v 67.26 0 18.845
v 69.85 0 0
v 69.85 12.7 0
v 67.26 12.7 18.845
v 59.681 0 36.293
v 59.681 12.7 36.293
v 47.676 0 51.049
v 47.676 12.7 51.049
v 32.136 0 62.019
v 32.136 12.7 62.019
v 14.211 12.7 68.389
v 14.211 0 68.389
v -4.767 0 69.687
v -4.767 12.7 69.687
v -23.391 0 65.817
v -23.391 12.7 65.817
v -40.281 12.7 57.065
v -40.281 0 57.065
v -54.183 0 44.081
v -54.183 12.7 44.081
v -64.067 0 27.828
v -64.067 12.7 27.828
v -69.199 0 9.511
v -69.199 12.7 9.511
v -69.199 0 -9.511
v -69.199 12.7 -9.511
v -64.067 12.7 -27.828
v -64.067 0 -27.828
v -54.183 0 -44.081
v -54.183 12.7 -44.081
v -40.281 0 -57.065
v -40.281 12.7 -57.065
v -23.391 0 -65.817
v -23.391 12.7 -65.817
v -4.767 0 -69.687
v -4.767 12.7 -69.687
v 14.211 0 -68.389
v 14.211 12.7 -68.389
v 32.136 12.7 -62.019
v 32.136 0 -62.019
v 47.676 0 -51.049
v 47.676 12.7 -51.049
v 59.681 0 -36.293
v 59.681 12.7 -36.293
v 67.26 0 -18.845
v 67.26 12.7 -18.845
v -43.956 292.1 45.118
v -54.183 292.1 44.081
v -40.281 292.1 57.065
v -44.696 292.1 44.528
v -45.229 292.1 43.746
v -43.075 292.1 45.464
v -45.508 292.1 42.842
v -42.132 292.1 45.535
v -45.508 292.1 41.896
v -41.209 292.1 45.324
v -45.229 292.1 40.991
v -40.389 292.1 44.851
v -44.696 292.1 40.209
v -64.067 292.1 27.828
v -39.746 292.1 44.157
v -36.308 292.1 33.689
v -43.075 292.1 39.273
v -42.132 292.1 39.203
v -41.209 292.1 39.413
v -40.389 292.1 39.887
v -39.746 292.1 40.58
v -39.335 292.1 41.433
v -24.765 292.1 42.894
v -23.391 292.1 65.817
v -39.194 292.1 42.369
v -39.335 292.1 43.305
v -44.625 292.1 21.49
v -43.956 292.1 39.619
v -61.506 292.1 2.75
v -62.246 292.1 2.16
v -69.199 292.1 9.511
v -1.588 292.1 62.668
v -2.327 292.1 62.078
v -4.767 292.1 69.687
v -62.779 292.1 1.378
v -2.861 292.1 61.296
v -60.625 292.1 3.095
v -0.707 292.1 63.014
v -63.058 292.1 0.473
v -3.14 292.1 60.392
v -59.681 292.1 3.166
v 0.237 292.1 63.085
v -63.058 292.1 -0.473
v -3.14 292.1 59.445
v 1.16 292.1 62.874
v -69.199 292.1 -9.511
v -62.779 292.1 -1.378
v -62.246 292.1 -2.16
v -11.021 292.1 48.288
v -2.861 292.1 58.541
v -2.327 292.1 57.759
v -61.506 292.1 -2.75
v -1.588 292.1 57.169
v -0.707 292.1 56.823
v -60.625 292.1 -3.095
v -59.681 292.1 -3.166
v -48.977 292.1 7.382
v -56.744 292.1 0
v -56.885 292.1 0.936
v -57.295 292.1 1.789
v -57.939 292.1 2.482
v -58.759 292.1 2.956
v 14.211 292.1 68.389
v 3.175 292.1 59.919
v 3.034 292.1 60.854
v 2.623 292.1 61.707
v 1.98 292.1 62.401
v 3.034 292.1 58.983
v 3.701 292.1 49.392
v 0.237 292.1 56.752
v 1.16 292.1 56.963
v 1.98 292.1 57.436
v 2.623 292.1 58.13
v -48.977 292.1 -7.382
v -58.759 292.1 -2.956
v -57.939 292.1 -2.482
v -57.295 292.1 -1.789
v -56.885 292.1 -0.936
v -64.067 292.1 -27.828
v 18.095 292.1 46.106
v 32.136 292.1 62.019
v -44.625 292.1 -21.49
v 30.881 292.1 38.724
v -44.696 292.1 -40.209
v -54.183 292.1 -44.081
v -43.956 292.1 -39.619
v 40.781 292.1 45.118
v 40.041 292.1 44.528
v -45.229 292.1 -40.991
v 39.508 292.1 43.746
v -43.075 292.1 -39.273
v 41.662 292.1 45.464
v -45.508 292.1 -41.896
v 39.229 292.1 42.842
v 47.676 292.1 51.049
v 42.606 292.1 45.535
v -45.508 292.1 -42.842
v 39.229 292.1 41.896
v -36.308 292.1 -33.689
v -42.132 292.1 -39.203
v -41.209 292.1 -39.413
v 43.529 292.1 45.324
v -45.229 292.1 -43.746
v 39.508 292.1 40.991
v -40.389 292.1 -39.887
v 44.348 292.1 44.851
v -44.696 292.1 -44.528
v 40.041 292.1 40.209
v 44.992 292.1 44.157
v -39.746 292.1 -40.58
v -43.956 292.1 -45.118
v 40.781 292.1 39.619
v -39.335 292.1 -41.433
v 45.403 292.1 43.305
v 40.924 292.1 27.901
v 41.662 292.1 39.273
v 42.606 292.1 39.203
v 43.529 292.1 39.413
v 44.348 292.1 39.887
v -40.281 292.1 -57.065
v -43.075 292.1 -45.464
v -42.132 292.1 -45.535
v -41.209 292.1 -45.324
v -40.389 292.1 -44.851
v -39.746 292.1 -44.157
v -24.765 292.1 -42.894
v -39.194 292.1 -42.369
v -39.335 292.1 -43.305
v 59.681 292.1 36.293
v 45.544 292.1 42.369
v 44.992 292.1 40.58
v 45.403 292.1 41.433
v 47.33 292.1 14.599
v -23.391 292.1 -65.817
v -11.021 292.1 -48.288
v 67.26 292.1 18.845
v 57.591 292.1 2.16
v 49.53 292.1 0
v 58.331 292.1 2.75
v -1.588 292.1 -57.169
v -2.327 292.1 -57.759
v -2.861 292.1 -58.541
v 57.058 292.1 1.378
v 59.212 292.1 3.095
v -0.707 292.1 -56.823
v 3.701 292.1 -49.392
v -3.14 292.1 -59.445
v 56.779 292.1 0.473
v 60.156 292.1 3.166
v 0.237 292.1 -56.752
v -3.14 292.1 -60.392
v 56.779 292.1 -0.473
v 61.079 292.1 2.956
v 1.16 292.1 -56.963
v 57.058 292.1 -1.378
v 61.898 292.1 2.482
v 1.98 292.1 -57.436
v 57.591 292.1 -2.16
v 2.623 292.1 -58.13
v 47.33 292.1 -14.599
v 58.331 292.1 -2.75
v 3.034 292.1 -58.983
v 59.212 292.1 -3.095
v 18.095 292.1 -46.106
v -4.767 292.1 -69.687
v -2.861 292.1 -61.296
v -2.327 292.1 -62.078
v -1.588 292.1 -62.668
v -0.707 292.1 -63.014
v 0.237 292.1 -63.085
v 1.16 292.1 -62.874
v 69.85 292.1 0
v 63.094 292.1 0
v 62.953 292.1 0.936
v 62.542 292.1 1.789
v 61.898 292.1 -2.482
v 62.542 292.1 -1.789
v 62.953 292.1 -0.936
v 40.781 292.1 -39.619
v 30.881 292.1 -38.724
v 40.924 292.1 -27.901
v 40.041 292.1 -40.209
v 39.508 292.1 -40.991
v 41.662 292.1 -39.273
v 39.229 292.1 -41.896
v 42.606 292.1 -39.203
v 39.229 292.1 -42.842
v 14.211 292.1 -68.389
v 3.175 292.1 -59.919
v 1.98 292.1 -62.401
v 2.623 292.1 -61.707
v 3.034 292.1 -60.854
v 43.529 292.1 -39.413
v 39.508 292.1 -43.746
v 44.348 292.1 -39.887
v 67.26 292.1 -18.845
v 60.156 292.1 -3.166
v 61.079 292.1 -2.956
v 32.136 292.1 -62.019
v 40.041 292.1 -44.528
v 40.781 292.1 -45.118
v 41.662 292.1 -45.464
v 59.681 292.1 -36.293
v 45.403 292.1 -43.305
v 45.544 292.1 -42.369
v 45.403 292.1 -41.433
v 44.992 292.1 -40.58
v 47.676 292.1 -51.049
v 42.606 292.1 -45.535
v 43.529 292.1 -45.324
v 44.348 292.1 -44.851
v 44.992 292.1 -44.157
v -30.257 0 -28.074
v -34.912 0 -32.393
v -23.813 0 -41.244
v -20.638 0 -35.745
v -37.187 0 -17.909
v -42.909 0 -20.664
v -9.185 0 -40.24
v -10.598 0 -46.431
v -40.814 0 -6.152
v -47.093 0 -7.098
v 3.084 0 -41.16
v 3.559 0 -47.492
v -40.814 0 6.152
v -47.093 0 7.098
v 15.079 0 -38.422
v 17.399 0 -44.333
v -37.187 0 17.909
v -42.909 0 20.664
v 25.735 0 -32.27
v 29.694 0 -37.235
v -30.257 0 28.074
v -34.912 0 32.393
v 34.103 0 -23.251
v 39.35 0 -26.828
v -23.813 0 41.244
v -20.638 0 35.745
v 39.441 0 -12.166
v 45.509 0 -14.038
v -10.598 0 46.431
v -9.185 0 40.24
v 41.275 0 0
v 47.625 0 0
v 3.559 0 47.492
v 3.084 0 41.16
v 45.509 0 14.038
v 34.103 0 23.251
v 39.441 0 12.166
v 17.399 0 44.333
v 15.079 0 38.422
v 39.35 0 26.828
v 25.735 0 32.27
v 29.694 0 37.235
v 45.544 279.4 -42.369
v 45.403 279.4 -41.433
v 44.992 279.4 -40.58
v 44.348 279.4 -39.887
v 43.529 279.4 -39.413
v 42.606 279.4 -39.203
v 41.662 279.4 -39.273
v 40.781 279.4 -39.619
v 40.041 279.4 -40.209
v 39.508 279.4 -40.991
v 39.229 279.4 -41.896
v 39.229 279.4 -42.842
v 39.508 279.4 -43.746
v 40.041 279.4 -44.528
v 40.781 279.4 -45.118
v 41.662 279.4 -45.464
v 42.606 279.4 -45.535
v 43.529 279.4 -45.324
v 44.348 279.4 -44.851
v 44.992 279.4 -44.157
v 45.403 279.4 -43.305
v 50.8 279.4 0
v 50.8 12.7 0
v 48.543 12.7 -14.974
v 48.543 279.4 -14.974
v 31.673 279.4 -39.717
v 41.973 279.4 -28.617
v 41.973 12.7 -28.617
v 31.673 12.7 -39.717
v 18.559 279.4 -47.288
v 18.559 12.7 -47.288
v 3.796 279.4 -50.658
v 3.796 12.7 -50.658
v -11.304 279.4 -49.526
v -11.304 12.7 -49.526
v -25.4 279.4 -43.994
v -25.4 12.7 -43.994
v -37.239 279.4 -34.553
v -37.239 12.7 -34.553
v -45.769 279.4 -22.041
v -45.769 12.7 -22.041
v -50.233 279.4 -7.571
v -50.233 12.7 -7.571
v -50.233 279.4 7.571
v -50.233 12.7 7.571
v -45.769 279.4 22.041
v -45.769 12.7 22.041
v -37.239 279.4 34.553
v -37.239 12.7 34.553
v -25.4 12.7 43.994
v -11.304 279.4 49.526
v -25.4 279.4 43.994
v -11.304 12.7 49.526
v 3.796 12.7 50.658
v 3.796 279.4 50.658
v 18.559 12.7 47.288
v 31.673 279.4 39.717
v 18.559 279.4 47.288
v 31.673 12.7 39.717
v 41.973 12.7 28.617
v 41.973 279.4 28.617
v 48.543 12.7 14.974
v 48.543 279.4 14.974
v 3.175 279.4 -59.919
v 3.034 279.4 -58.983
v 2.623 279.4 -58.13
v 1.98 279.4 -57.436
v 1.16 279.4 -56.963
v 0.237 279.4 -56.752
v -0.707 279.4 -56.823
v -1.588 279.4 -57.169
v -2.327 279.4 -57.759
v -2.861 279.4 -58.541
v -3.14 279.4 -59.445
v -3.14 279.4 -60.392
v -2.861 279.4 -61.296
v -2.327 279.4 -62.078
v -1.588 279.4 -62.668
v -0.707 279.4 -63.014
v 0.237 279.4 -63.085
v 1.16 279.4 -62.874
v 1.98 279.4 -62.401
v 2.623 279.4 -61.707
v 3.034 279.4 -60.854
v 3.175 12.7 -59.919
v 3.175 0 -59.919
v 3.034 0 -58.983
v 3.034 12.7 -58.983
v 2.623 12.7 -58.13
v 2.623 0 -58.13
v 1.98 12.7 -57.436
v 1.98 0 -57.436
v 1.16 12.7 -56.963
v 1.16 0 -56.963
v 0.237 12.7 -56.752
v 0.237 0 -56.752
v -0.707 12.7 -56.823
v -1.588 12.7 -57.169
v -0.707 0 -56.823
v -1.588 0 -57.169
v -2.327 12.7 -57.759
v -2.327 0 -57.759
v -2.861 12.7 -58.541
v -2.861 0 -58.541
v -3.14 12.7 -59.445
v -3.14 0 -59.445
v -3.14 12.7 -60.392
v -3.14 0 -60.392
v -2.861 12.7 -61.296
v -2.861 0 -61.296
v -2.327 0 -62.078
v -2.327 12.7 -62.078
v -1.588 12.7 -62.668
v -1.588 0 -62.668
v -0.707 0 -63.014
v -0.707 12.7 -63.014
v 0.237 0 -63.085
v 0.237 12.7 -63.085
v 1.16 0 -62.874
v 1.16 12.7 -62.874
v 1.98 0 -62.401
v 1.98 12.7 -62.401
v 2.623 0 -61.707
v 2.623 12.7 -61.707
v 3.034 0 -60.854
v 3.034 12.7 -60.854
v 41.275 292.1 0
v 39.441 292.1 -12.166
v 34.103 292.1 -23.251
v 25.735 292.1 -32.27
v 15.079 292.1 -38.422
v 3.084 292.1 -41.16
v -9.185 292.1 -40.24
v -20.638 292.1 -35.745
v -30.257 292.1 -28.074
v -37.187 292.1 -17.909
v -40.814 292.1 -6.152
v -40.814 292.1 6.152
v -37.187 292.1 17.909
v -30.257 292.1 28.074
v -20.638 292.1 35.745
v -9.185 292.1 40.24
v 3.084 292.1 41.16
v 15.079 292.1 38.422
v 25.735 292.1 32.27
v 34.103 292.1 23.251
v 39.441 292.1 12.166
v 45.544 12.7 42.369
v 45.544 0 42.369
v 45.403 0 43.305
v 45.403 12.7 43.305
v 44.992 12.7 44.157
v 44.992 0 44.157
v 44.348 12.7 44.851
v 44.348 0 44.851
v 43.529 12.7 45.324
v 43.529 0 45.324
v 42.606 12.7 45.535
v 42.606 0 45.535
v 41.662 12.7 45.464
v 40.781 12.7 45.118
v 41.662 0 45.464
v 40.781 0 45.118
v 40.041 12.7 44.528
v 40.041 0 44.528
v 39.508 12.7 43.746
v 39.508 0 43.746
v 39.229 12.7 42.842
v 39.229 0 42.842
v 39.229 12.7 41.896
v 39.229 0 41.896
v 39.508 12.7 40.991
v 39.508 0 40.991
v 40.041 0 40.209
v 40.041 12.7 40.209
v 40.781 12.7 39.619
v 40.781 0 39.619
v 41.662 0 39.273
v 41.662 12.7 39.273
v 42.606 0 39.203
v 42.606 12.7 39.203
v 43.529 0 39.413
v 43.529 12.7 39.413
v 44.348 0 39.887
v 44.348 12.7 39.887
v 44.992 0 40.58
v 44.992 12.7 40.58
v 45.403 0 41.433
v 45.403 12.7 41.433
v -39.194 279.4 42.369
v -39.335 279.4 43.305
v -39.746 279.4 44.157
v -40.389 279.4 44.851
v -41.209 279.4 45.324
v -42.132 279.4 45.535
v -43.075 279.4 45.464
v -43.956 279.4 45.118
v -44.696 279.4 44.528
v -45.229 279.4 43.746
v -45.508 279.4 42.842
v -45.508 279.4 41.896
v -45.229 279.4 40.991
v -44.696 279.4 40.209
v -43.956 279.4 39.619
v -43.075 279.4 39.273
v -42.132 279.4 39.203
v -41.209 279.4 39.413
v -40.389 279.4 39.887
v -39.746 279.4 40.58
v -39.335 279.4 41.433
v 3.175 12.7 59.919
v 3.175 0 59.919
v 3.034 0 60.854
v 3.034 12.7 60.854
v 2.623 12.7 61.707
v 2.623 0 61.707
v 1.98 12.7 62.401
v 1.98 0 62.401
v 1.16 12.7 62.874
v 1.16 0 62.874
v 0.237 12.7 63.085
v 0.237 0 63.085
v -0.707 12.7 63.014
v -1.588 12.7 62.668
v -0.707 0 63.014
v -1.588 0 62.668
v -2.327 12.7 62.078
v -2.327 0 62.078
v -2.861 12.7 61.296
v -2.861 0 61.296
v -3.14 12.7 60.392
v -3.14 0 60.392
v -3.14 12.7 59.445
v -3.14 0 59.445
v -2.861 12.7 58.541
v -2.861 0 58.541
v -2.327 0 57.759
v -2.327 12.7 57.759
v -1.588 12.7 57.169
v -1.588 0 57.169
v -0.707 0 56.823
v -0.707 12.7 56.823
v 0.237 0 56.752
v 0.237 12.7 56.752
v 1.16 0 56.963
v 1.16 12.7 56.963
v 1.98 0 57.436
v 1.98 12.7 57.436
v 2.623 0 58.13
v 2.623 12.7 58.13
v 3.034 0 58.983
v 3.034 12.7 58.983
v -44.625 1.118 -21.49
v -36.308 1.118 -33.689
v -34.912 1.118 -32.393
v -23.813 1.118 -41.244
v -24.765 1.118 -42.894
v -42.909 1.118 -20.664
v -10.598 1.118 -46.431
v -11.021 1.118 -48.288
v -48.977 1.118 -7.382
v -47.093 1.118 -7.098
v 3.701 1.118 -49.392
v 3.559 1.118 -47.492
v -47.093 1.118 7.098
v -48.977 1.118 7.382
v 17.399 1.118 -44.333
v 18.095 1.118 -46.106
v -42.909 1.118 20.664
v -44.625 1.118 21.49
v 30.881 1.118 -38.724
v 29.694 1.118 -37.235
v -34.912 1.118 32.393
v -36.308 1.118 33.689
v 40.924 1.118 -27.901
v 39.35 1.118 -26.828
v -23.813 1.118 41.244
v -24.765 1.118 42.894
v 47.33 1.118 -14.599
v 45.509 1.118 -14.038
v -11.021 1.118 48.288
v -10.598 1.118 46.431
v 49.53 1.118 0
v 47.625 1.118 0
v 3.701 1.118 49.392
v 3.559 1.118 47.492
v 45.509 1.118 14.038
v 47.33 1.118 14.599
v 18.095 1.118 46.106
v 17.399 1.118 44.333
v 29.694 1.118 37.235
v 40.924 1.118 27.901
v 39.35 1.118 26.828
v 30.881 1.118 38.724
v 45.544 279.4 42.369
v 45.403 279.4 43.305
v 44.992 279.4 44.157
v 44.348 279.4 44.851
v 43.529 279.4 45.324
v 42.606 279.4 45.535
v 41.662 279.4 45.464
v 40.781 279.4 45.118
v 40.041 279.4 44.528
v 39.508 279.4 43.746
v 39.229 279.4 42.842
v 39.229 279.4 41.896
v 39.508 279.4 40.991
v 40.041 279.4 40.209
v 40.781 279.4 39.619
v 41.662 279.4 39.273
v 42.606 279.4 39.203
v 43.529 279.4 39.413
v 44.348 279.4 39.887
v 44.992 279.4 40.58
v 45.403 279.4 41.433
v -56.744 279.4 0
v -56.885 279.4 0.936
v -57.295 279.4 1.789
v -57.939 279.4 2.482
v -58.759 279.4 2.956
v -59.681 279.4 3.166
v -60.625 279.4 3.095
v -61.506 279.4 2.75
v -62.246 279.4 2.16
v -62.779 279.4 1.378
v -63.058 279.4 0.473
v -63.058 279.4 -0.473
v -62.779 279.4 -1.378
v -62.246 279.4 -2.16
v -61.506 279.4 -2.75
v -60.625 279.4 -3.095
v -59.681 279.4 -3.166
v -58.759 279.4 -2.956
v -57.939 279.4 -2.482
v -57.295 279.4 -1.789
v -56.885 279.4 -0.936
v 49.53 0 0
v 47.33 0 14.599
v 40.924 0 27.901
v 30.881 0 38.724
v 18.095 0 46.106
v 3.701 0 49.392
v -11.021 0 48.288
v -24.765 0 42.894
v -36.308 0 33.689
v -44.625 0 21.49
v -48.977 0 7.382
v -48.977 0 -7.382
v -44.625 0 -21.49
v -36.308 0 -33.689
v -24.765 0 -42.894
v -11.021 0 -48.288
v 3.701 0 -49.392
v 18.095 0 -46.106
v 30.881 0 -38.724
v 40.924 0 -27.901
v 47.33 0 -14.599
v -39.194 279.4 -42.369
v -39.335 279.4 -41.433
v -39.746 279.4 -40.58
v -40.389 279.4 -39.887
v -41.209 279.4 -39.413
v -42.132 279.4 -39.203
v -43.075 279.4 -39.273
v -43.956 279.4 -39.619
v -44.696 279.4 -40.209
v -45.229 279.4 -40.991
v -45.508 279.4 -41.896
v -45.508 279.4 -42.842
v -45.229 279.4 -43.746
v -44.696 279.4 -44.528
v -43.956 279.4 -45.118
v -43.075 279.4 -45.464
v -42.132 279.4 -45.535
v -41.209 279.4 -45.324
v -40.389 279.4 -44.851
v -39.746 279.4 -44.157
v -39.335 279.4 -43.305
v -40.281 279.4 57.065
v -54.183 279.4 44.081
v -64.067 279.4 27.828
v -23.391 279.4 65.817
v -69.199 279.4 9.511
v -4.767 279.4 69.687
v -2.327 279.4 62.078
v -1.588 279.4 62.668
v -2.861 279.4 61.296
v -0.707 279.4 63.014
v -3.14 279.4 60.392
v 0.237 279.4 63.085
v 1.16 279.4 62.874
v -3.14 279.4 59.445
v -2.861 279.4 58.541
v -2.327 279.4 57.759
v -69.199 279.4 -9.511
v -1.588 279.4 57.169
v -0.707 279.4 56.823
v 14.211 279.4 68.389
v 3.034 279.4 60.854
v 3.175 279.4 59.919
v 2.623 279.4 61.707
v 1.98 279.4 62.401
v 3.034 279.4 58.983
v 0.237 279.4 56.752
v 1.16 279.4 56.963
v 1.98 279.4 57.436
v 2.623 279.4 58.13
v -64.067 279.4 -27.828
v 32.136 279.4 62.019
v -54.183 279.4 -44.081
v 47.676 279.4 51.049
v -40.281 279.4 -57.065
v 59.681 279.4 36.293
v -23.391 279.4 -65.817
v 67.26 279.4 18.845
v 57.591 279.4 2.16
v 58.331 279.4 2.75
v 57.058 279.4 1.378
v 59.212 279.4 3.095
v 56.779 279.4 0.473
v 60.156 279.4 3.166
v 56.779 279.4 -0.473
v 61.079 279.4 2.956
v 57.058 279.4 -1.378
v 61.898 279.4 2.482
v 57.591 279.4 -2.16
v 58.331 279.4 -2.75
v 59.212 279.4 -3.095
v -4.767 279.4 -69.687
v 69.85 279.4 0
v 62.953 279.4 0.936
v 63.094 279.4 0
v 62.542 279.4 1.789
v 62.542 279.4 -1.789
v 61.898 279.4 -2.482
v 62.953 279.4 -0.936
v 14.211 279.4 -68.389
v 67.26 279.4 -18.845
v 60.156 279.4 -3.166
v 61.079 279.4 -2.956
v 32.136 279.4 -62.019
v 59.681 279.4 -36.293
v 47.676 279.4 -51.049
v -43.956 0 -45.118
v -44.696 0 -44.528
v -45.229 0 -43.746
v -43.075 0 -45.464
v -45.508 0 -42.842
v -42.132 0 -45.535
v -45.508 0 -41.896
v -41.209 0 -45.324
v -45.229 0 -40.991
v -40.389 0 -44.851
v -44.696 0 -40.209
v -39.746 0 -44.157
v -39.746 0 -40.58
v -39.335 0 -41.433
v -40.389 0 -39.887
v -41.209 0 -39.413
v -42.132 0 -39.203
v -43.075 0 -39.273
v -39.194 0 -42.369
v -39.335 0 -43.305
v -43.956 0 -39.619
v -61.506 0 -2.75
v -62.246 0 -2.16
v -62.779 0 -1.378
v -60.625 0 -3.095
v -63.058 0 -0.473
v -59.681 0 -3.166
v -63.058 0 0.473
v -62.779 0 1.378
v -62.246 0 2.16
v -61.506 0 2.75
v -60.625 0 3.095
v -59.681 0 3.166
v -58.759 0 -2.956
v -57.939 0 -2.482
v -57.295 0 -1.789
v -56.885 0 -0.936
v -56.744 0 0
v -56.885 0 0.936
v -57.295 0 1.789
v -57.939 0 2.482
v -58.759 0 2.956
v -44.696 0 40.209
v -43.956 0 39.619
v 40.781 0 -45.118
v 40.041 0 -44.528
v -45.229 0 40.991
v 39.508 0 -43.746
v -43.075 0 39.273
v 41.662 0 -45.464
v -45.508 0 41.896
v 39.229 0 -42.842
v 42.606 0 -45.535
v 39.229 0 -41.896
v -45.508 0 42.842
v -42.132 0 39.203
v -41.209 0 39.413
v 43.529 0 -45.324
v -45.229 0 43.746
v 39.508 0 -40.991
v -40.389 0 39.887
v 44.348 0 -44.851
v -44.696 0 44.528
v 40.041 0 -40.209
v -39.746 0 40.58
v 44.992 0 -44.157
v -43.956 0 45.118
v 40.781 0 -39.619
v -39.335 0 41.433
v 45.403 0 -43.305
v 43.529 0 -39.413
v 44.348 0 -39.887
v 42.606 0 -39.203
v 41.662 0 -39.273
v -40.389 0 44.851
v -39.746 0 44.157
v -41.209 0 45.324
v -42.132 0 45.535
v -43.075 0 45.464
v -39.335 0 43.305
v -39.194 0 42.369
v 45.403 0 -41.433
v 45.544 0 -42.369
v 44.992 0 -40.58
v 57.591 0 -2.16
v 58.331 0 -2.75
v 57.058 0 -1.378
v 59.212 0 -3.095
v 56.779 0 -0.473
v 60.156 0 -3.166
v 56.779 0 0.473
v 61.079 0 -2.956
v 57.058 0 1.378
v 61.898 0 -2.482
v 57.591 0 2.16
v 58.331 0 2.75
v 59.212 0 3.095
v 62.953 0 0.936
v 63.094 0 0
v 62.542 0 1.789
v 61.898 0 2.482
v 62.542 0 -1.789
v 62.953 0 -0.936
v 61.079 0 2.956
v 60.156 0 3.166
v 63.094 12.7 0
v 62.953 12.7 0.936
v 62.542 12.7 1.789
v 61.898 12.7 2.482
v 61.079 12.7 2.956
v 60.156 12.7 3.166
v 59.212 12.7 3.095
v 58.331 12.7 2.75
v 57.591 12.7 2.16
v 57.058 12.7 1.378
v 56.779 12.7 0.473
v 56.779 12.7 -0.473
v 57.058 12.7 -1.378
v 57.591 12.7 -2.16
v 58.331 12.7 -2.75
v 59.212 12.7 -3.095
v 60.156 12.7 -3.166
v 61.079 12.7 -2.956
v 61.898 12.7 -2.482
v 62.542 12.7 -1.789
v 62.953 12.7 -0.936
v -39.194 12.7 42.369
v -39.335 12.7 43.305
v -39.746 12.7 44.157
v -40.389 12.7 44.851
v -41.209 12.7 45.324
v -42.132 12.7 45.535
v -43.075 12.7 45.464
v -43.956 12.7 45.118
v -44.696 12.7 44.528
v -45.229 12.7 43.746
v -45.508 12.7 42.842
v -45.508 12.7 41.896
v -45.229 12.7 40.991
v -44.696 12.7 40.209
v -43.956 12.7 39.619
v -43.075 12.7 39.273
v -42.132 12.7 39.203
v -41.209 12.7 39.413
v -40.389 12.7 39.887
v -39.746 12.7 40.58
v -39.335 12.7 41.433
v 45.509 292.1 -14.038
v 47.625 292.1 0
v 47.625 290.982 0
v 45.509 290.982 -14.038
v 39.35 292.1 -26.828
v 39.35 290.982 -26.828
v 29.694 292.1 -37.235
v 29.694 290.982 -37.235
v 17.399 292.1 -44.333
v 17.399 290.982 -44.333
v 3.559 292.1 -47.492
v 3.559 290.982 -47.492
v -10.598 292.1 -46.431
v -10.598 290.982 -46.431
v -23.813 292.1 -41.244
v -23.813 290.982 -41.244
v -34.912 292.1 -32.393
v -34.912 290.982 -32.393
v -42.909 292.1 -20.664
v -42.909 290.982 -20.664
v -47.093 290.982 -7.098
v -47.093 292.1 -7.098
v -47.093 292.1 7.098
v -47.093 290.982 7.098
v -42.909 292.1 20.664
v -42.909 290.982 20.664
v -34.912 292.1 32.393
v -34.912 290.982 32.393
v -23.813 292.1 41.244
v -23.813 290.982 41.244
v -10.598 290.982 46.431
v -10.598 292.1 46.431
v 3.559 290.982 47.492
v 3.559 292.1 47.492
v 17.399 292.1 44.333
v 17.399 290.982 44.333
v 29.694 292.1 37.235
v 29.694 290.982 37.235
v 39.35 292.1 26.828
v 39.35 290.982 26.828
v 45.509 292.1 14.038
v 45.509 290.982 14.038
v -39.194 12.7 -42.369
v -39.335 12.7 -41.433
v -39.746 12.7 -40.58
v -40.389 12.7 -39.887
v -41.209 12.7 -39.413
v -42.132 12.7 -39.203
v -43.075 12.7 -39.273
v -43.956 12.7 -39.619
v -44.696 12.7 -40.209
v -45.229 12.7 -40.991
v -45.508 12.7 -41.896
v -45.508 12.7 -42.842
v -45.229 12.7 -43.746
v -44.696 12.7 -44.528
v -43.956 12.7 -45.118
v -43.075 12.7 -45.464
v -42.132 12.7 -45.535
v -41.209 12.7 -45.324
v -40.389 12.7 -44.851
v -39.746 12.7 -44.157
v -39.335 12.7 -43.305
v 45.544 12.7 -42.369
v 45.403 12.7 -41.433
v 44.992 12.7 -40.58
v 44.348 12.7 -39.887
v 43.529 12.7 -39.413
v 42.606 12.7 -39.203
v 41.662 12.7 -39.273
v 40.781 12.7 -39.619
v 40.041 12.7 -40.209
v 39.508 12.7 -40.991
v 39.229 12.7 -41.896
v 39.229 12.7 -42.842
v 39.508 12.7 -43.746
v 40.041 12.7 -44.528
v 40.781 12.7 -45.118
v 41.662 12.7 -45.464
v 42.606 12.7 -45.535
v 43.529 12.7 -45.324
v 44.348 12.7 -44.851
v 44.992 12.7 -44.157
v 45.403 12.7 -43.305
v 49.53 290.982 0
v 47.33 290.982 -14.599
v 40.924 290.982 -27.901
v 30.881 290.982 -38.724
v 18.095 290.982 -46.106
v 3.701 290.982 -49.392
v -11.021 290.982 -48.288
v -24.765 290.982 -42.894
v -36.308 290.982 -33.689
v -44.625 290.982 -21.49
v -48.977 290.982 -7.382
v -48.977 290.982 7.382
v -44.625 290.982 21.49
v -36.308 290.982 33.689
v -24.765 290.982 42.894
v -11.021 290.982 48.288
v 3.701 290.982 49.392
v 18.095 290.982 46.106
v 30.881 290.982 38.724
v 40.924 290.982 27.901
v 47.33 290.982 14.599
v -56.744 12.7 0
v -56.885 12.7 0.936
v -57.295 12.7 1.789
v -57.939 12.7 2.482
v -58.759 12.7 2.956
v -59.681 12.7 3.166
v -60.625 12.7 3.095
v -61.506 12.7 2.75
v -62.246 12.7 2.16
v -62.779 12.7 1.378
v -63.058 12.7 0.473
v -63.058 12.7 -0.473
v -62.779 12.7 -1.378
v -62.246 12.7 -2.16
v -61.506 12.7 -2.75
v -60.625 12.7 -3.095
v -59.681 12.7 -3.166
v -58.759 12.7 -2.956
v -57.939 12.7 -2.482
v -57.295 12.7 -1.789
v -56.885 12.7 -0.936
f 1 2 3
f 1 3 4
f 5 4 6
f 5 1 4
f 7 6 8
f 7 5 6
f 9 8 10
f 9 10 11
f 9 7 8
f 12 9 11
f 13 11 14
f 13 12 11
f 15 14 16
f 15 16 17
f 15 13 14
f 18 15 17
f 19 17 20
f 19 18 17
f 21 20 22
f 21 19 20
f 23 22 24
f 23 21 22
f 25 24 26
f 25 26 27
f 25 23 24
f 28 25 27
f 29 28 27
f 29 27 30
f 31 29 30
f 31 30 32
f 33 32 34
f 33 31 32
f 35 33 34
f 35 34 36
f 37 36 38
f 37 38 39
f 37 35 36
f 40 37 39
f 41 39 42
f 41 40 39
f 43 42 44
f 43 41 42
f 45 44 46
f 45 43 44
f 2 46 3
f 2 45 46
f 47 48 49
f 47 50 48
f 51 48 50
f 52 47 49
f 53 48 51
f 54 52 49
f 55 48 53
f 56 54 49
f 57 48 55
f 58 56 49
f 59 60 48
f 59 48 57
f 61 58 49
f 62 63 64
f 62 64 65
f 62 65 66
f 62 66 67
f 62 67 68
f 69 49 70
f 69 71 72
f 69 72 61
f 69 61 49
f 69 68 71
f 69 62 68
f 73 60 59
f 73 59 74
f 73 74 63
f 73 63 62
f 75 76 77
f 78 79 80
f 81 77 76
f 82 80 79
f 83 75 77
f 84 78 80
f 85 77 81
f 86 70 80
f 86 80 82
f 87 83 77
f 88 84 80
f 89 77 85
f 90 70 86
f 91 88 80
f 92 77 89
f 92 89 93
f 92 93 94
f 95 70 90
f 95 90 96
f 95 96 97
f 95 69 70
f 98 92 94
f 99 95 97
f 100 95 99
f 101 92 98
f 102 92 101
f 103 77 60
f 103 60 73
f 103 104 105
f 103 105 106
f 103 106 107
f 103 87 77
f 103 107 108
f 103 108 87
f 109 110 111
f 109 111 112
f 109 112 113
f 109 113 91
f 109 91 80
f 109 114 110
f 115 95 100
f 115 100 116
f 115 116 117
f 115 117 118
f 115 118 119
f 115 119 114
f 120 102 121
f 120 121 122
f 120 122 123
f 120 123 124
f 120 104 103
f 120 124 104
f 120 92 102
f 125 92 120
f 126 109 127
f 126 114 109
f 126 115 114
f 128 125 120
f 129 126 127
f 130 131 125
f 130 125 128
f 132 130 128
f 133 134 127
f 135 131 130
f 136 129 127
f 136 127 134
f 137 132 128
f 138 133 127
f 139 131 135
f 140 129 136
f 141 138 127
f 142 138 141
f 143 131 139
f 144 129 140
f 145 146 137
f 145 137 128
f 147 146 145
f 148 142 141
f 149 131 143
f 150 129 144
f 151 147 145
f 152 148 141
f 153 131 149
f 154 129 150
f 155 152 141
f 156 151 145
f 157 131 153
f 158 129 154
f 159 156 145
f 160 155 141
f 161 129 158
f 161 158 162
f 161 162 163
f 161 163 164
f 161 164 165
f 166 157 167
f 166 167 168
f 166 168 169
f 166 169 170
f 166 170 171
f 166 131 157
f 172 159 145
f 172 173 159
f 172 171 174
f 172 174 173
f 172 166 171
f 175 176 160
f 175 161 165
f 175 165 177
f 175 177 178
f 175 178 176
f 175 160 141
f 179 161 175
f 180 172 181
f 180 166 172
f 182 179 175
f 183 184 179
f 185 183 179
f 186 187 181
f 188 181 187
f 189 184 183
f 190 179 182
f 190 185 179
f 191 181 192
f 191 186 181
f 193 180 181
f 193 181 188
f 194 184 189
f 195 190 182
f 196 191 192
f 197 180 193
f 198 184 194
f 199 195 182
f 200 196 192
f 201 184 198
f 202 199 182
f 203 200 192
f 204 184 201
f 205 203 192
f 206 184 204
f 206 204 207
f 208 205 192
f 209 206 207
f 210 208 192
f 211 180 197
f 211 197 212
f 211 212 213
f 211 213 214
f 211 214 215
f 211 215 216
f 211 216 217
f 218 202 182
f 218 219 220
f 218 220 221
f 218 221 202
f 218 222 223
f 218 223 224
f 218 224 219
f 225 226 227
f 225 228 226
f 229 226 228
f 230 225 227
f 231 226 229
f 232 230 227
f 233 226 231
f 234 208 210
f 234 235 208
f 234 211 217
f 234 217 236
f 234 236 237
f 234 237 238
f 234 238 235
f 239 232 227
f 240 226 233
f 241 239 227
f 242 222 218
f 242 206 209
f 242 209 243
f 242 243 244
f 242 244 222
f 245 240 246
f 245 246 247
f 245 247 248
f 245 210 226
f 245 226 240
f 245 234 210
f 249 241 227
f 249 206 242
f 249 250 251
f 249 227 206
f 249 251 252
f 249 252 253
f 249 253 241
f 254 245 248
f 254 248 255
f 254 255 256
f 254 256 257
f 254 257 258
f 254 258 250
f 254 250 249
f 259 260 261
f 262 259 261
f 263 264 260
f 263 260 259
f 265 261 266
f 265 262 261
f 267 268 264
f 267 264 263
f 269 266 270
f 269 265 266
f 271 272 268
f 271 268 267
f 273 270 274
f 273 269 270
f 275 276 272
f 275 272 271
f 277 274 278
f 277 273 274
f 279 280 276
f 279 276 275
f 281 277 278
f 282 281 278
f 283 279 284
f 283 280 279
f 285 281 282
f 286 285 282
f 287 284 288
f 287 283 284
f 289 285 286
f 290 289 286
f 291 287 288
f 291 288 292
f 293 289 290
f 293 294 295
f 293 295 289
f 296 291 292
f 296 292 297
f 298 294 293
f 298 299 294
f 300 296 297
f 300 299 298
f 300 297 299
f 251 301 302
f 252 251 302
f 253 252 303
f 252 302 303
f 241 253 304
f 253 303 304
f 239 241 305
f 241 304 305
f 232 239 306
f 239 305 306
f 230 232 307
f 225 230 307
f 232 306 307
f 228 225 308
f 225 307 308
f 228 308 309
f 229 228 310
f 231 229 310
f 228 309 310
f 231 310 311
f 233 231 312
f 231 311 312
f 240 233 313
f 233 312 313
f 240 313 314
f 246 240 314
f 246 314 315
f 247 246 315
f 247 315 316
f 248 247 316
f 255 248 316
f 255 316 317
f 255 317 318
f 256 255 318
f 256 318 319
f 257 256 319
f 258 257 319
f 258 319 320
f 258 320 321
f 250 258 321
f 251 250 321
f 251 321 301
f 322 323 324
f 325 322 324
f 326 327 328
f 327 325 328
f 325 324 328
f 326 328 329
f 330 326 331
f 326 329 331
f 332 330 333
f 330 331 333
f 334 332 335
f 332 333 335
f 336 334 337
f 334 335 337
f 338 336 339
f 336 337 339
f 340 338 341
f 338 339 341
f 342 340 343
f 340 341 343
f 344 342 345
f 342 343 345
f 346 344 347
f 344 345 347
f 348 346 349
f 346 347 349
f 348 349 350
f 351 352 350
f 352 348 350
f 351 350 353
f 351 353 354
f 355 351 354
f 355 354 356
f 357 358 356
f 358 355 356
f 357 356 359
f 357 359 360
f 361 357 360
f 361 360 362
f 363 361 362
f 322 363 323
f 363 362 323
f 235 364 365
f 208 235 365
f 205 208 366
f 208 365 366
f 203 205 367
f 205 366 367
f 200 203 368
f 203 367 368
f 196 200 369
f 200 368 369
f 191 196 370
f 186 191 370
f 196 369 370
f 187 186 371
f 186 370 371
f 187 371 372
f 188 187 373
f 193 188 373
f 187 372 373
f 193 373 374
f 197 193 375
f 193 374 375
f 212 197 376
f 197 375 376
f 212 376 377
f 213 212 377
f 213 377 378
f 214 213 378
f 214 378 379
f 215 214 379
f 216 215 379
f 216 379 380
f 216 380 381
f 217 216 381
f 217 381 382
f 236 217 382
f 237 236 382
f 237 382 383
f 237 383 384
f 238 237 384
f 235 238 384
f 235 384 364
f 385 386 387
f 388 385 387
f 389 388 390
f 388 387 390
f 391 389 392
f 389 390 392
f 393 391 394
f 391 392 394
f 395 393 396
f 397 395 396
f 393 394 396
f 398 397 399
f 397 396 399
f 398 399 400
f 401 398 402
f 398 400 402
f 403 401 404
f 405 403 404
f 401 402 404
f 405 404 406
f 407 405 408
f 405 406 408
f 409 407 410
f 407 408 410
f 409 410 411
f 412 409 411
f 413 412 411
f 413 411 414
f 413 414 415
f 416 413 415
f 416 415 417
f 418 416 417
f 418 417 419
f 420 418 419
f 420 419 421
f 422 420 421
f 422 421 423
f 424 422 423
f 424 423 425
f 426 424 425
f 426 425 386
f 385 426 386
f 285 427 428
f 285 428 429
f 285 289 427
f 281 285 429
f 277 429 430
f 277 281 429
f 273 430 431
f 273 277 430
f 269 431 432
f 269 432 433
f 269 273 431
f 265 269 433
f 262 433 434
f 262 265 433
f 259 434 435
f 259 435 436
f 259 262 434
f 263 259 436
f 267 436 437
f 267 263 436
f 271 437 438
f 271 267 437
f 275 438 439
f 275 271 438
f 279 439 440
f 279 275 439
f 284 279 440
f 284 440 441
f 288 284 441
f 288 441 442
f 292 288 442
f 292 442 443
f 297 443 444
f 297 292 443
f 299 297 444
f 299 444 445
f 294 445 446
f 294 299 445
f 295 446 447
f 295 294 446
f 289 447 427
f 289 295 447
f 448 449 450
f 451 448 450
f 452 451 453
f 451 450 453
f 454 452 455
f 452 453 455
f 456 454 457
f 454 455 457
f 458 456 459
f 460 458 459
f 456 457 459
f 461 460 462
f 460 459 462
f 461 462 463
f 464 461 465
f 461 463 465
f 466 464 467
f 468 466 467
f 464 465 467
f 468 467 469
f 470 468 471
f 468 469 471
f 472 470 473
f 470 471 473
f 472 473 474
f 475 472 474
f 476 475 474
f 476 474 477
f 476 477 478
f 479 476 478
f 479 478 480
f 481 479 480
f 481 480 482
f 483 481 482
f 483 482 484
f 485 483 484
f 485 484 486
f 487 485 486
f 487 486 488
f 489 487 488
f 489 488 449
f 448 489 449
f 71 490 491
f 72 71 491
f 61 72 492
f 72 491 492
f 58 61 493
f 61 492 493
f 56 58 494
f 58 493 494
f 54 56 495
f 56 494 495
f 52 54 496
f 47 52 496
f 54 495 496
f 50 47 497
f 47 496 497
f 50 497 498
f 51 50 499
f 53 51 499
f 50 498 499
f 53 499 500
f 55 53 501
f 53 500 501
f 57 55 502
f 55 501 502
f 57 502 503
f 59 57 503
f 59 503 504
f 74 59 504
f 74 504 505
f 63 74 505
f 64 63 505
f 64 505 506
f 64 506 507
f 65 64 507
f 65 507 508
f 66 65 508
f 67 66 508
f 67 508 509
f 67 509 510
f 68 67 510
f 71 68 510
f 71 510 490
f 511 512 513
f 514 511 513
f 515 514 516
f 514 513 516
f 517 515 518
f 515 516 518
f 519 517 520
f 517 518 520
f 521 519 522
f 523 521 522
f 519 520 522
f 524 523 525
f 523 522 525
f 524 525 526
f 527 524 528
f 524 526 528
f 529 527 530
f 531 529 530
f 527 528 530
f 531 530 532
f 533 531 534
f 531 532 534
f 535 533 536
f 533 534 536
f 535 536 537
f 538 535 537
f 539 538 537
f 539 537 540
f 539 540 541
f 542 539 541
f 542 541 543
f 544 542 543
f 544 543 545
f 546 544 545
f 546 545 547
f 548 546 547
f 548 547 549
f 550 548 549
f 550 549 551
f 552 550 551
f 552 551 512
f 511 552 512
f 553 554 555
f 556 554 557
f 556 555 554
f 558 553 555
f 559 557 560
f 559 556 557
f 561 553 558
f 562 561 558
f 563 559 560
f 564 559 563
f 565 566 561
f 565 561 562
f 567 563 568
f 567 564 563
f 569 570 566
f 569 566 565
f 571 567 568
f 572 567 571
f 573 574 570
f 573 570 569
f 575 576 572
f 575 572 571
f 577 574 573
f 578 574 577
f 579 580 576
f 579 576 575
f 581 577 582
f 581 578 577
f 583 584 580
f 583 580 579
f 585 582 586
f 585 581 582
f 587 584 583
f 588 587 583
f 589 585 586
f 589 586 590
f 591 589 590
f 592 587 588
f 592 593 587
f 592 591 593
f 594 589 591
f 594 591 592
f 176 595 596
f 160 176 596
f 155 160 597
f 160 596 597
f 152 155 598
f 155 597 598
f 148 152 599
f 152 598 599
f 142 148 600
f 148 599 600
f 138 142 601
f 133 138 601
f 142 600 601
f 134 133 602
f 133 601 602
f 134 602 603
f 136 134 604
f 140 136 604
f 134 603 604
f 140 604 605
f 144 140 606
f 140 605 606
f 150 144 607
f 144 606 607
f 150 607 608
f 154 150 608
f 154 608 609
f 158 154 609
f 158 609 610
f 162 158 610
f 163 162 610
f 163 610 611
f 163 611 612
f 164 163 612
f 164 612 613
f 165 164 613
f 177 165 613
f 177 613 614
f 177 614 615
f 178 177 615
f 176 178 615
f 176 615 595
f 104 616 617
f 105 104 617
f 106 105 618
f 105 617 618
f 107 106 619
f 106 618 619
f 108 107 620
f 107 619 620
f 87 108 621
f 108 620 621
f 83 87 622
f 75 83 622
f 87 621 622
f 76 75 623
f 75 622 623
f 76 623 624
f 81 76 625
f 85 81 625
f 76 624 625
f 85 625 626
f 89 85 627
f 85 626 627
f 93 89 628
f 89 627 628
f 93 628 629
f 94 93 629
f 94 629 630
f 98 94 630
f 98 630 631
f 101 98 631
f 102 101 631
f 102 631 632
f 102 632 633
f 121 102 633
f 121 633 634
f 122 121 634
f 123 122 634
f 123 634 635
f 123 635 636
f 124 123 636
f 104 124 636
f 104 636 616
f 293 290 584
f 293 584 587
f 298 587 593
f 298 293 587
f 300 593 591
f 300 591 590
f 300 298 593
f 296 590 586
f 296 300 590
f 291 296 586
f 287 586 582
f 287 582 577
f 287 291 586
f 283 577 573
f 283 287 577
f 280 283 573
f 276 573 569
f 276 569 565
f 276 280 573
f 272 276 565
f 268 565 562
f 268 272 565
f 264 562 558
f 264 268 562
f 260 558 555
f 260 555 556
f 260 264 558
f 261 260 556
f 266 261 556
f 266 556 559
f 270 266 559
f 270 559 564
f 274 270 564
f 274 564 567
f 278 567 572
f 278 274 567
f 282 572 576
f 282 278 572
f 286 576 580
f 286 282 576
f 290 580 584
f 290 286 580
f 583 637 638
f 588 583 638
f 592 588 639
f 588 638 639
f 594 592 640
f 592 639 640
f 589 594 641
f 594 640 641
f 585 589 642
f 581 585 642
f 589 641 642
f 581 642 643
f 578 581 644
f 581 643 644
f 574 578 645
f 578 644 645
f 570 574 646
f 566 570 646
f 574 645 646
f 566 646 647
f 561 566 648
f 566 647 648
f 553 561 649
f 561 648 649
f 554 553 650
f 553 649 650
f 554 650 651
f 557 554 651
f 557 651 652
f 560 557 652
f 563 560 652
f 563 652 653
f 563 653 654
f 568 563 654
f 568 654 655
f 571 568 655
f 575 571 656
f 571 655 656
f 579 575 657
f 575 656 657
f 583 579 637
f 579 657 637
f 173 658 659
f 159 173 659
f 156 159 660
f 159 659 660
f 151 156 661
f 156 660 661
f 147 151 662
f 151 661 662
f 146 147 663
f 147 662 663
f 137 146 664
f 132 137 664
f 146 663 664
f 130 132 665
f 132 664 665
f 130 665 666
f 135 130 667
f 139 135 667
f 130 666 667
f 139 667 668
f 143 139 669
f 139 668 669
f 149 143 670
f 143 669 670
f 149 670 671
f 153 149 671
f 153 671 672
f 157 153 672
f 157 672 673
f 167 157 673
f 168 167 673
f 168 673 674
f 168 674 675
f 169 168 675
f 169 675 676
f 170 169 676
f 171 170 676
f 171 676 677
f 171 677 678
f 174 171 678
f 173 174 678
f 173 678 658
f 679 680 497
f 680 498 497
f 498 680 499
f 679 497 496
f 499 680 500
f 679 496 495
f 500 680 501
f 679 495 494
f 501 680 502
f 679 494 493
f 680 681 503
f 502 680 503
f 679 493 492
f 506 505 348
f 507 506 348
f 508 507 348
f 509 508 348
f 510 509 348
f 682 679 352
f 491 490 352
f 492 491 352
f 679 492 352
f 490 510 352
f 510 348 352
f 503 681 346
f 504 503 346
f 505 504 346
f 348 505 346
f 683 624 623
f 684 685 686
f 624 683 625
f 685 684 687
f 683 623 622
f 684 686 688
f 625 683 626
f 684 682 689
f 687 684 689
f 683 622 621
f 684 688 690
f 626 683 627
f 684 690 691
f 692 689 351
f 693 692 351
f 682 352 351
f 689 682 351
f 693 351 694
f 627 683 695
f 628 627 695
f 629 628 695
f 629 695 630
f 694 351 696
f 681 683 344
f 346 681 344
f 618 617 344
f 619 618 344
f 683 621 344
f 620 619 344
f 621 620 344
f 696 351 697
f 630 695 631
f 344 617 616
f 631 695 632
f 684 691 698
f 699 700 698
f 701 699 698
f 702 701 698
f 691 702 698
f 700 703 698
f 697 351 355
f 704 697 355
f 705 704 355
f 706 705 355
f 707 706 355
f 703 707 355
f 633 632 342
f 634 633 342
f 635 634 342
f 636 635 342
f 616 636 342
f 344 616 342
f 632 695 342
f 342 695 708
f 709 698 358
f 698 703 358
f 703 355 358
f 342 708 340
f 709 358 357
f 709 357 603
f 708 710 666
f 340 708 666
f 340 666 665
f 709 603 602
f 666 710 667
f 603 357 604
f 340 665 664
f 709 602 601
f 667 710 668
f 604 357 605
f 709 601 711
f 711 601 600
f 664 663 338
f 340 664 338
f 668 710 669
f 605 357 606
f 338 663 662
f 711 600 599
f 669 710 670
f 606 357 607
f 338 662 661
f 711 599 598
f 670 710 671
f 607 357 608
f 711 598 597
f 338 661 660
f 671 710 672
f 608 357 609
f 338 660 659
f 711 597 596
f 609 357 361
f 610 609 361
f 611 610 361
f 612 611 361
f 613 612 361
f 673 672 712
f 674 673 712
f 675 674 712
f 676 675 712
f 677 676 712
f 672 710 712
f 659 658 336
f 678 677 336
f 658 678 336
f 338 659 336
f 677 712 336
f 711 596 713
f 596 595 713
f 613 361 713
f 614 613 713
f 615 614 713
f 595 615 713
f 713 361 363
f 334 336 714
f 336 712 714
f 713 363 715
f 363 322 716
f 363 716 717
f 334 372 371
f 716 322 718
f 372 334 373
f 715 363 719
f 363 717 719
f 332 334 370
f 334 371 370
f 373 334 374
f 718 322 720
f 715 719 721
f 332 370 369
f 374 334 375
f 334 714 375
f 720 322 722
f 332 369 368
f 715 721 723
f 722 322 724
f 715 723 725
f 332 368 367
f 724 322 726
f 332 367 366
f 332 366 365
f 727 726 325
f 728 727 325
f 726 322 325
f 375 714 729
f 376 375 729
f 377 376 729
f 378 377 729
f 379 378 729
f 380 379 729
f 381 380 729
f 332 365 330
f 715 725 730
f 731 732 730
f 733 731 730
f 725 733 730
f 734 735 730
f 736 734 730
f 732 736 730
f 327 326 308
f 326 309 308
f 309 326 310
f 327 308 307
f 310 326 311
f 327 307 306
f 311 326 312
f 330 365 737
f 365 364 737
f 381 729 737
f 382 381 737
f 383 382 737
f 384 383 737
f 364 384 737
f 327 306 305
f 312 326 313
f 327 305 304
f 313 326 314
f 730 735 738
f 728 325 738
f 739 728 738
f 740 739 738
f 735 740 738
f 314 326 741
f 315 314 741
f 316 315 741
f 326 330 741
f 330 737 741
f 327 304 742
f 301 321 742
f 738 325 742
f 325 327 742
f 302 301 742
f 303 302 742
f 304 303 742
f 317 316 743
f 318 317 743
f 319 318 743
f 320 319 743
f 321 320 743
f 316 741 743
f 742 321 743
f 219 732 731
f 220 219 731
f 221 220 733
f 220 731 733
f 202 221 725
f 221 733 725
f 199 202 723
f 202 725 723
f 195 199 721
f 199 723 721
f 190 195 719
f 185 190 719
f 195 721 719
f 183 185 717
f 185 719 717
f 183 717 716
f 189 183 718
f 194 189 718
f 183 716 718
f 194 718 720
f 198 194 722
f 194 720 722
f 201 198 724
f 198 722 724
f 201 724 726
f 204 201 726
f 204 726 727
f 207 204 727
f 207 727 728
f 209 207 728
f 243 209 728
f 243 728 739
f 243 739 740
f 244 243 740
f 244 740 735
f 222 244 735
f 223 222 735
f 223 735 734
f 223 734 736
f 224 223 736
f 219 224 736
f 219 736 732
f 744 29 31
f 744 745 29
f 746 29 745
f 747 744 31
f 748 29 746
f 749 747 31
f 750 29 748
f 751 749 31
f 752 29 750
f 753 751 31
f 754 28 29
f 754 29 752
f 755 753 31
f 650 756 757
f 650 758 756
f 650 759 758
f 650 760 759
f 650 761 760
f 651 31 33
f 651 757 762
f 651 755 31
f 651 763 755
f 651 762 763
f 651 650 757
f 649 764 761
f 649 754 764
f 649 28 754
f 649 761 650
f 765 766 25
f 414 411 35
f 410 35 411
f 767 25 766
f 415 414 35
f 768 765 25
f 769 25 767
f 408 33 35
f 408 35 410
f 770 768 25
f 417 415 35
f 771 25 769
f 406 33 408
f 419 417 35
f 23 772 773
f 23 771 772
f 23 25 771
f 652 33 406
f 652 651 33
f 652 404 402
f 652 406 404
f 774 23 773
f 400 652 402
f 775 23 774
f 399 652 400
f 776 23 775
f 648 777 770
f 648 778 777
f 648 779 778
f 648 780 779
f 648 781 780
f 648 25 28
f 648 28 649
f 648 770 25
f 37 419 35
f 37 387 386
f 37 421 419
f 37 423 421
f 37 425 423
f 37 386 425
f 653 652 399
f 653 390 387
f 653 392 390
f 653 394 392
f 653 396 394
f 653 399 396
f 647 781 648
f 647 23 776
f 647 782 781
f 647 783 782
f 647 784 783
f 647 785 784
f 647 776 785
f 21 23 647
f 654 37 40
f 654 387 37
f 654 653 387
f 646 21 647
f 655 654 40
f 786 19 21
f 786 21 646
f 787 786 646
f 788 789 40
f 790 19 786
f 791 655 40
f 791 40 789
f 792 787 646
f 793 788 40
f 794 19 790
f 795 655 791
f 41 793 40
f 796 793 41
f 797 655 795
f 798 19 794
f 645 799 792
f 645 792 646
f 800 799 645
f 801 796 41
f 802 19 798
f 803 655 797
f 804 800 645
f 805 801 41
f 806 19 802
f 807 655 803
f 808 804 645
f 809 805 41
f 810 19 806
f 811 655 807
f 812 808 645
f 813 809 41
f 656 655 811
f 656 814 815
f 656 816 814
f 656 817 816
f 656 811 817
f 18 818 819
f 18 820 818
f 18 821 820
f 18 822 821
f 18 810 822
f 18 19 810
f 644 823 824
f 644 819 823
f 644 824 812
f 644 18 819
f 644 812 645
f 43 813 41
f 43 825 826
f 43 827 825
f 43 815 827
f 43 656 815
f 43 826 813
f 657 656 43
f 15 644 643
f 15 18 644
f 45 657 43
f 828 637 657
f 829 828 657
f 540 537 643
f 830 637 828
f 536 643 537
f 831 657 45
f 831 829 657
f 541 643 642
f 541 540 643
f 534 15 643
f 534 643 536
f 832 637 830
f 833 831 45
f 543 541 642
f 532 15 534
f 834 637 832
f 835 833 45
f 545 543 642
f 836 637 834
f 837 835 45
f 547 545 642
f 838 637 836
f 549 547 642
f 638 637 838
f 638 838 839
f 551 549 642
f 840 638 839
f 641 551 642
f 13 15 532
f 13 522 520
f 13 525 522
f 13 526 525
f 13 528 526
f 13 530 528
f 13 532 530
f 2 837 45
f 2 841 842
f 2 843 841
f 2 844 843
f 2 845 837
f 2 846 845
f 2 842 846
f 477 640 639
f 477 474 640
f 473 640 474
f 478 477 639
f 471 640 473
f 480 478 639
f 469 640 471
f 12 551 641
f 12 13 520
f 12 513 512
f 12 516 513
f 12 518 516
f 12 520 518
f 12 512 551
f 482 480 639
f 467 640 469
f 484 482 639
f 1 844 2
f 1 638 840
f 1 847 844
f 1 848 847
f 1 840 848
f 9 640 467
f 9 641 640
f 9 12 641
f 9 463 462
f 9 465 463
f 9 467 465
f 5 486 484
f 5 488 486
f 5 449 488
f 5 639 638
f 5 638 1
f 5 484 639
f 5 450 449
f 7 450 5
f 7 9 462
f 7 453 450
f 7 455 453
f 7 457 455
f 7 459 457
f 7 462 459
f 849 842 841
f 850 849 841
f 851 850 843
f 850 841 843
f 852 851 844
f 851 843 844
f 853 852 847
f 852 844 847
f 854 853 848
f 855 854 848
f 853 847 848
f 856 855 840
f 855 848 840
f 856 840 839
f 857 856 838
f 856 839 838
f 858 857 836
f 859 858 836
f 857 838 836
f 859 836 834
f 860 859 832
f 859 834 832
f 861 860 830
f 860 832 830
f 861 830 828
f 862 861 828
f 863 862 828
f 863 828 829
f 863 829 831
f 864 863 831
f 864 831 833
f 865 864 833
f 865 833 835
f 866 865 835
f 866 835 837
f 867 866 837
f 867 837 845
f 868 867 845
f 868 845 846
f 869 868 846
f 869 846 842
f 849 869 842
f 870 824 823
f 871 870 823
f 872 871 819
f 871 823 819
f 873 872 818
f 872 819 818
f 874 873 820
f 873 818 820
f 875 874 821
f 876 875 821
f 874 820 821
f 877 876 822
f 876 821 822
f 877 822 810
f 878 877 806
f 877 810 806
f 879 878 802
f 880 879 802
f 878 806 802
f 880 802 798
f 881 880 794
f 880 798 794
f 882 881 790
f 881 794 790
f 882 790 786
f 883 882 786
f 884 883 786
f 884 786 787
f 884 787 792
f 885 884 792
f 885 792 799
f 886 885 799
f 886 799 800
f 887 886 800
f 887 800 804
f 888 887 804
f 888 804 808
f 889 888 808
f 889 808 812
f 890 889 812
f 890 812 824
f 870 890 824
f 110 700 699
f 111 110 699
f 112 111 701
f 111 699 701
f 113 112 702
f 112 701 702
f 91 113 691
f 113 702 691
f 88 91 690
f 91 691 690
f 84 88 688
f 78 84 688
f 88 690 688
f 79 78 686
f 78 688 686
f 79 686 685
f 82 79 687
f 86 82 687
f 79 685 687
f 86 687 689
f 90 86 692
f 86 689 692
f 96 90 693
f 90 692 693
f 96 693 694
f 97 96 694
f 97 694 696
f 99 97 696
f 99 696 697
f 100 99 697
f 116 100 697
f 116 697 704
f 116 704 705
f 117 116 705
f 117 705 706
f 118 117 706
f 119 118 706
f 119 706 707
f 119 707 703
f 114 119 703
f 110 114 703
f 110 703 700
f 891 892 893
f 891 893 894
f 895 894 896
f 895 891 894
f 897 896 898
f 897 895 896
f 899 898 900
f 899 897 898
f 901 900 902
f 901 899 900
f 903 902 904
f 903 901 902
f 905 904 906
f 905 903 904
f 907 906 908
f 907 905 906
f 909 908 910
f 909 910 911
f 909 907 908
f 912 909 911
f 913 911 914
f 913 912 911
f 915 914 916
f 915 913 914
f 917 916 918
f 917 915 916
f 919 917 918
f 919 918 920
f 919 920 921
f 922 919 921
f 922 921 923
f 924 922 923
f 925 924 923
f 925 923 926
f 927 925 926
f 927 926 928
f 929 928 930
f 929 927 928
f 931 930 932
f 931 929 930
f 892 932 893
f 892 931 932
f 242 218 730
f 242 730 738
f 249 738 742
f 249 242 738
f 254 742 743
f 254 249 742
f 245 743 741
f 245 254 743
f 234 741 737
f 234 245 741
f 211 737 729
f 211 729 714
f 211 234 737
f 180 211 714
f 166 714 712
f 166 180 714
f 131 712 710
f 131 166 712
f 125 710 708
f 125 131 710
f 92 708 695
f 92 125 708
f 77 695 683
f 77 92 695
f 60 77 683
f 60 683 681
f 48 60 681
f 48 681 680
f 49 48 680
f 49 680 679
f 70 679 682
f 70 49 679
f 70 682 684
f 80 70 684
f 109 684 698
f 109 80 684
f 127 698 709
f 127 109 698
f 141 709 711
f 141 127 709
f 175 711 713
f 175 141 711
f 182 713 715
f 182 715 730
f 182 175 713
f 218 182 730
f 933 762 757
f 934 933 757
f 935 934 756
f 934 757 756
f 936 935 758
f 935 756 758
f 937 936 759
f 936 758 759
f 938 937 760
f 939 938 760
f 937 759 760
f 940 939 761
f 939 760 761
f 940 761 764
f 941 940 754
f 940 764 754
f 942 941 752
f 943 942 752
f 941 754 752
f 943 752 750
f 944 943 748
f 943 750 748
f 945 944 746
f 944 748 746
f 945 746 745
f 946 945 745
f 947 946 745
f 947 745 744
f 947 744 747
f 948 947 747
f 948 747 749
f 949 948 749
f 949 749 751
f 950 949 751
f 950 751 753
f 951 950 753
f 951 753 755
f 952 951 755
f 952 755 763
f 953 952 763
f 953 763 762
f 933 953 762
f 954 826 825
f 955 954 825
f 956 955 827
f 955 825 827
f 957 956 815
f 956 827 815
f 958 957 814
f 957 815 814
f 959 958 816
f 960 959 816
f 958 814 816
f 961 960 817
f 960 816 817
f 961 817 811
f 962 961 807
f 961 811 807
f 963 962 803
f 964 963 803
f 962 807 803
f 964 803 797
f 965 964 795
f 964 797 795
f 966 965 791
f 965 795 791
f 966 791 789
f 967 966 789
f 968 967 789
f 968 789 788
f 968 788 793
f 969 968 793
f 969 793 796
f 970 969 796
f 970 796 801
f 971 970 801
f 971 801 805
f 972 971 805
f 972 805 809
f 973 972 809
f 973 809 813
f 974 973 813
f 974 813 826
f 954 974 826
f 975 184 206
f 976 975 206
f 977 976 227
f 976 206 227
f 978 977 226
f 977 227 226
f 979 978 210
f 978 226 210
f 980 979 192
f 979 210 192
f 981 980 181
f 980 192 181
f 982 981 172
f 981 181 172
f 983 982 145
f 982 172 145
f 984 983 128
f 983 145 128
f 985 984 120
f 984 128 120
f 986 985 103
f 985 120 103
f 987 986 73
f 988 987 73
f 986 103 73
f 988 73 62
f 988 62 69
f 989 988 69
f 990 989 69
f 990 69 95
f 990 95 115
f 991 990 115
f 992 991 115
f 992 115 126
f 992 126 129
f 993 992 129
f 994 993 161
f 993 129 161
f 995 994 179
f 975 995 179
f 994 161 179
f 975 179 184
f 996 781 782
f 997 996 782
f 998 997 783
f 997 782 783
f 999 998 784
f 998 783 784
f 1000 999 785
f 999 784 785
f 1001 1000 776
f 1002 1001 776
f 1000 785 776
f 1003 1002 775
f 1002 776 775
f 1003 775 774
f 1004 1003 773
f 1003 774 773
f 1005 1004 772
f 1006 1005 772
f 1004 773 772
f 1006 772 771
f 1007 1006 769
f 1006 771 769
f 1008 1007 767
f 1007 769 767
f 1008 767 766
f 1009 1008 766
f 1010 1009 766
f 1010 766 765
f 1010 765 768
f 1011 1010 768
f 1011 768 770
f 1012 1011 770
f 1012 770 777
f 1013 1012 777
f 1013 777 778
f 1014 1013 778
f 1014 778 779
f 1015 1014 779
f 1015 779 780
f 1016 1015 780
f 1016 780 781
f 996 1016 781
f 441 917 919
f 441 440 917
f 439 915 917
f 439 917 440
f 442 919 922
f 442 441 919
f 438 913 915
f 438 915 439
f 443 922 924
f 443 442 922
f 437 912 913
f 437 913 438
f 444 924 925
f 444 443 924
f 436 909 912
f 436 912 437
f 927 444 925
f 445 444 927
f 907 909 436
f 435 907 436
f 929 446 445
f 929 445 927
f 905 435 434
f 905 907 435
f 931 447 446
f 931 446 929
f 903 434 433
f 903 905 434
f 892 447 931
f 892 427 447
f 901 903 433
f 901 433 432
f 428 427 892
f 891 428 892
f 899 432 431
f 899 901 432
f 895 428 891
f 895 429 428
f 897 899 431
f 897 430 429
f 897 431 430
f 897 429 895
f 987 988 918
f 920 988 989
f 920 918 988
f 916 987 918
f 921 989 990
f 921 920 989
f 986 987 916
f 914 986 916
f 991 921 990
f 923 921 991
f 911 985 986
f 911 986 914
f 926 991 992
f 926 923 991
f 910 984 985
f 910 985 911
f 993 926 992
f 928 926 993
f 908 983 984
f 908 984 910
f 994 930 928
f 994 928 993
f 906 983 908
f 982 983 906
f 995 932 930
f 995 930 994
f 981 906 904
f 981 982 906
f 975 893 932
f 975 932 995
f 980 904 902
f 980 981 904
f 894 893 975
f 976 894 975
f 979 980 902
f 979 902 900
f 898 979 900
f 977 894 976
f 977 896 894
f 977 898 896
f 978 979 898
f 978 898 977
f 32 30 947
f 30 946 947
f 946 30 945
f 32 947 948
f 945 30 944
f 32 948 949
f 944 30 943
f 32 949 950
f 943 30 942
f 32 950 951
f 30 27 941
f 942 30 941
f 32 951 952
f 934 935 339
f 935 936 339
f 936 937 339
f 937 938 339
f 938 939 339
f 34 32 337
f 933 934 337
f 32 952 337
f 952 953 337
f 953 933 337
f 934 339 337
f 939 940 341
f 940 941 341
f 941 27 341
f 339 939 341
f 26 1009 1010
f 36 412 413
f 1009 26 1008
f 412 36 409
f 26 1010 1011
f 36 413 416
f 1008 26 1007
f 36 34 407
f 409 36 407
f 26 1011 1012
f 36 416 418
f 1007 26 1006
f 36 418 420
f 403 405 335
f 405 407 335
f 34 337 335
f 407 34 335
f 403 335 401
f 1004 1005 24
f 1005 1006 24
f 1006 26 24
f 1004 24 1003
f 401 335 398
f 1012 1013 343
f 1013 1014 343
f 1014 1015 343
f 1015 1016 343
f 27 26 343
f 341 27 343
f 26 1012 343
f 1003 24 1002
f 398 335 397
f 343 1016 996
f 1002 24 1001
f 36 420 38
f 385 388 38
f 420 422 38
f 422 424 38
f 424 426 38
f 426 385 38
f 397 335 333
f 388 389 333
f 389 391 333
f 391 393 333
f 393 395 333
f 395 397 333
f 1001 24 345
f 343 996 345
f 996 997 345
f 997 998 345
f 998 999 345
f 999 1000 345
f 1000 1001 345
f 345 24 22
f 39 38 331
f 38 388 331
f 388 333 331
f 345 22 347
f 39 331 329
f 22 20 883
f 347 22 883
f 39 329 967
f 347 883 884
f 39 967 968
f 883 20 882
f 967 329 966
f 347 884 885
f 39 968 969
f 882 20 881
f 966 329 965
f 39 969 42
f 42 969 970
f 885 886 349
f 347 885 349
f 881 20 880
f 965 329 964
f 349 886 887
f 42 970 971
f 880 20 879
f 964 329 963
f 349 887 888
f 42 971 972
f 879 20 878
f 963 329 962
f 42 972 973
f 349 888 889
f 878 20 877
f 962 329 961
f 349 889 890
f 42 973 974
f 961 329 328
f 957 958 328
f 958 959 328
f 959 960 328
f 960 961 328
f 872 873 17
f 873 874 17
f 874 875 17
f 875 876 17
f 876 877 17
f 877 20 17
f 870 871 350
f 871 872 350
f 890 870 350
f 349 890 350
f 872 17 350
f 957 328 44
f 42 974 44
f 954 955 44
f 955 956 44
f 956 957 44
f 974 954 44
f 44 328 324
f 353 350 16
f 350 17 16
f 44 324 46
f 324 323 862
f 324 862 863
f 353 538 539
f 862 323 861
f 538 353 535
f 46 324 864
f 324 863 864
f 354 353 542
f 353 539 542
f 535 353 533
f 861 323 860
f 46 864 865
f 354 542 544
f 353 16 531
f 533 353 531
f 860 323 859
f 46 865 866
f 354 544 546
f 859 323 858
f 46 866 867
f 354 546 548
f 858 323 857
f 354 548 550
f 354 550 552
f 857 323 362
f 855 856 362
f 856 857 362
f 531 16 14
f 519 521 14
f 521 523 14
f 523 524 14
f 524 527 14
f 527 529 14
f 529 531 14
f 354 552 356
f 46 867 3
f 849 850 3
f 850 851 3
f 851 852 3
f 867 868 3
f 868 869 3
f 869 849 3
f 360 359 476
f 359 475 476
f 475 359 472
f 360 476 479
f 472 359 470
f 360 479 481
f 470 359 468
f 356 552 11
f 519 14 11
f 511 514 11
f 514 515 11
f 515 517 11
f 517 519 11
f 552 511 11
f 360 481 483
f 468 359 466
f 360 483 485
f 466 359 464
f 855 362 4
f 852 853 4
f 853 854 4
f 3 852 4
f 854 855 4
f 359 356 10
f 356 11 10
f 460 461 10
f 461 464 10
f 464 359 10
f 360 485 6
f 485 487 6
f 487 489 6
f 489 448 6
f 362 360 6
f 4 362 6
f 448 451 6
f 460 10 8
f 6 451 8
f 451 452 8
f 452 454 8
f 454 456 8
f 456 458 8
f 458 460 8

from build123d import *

# Parameters (mm, degrees)
SKETCH2_R               = 50.8
SKETCH2_R_2             = 41.275
BASE_CYLINDER_DEPTH     = 292.1
SKETCH3_R               = 69.85
SKETCH3_R_2             = 41.275
AFT_FLANGE_DEPTH        = 12.7
SKETCH4_R               = 69.85
SKETCH4_R_2             = 41.275
FORWARD_FLANGE_DEPTH    = 12.7
SKETCH6_R               = 49.53
SKETCH6_R_2             = 47.625
O_RING_SLOT_1_DEPTH     = 1.1176
SKETCH7_R               = 49.53
SKETCH7_R_2             = 47.625
O_RING_SLOT_2_DEPTH     = 1.1176
SKETCH8_R               = 3.175
CUT_EXTRUDE4_DEPTH      = 1
CUT_EXTRUDE4_DEPTH_BACK = 293.1


with BuildPart() as part:
    # Sketch2 → Base Cylinder (new body)
    with BuildSketch(Plane(origin=(0, 0, 0), x_dir=(1, 0, 0), z_dir=(0, 1, 0))):
        Circle(SKETCH2_R)
        Circle(SKETCH2_R_2, mode=Mode.SUBTRACT)
    extrude(amount=BASE_CYLINDER_DEPTH)

    # Sketch3 → Aft Flange (add)
    with BuildSketch(Plane.XZ):
        Circle(SKETCH3_R)
        Circle(SKETCH3_R_2, mode=Mode.SUBTRACT)
    extrude(amount=-AFT_FLANGE_DEPTH)

    # Sketch4 → Forward Flange (add)
    with BuildSketch(Plane(origin=(0, 292.1, 0), x_dir=(1, 0, 0), z_dir=(0, 1, 0))):
        Circle(SKETCH4_R)
        Circle(SKETCH4_R_2, mode=Mode.SUBTRACT)
    extrude(amount=-FORWARD_FLANGE_DEPTH)

    # Sketch6 → O-Ring Slot 1 (cut)
    with BuildSketch(Plane.XZ):
        Circle(SKETCH6_R)
        Circle(SKETCH6_R_2, mode=Mode.SUBTRACT)
    extrude(amount=-O_RING_SLOT_1_DEPTH, mode=Mode.SUBTRACT)

    # Sketch7 → O-Ring Slot 2 (cut)
    with BuildSketch(Plane(origin=(0, 292.1, 0), x_dir=(1, 0, 0), z_dir=(0, 1, 0))):
        Circle(SKETCH7_R)
        Circle(SKETCH7_R_2, mode=Mode.SUBTRACT)
    extrude(amount=-O_RING_SLOT_2_DEPTH, mode=Mode.SUBTRACT)

    # Sketch8 → Cut-Extrude4 (cut, two sides)
    with BuildSketch(Plane.XZ) as cut_extrude4_sk:
        with Locations((-59.9186, 0)):
            Circle(SKETCH8_R)
        with Locations((-42.368848379, 42.368848379)):
            Circle(SKETCH8_R)
        with Locations((0, 59.9186)):
            Circle(SKETCH8_R)
        with Locations((42.368848379, 42.368848379)):
            Circle(SKETCH8_R)
        with Locations((59.9186, 0)):
            Circle(SKETCH8_R)
        with Locations((42.368848379, -42.368848379)):
            Circle(SKETCH8_R)
        with Locations((0, -59.9186)):
            Circle(SKETCH8_R)
        with Locations((-42.368848379, -42.368848379)):
            Circle(SKETCH8_R)
    extrude(amount=CUT_EXTRUDE4_DEPTH, mode=Mode.SUBTRACT)
    extrude(cut_extrude4_sk.sketch, amount=-CUT_EXTRUDE4_DEPTH_BACK, mode=Mode.SUBTRACT)


solid = part.part
